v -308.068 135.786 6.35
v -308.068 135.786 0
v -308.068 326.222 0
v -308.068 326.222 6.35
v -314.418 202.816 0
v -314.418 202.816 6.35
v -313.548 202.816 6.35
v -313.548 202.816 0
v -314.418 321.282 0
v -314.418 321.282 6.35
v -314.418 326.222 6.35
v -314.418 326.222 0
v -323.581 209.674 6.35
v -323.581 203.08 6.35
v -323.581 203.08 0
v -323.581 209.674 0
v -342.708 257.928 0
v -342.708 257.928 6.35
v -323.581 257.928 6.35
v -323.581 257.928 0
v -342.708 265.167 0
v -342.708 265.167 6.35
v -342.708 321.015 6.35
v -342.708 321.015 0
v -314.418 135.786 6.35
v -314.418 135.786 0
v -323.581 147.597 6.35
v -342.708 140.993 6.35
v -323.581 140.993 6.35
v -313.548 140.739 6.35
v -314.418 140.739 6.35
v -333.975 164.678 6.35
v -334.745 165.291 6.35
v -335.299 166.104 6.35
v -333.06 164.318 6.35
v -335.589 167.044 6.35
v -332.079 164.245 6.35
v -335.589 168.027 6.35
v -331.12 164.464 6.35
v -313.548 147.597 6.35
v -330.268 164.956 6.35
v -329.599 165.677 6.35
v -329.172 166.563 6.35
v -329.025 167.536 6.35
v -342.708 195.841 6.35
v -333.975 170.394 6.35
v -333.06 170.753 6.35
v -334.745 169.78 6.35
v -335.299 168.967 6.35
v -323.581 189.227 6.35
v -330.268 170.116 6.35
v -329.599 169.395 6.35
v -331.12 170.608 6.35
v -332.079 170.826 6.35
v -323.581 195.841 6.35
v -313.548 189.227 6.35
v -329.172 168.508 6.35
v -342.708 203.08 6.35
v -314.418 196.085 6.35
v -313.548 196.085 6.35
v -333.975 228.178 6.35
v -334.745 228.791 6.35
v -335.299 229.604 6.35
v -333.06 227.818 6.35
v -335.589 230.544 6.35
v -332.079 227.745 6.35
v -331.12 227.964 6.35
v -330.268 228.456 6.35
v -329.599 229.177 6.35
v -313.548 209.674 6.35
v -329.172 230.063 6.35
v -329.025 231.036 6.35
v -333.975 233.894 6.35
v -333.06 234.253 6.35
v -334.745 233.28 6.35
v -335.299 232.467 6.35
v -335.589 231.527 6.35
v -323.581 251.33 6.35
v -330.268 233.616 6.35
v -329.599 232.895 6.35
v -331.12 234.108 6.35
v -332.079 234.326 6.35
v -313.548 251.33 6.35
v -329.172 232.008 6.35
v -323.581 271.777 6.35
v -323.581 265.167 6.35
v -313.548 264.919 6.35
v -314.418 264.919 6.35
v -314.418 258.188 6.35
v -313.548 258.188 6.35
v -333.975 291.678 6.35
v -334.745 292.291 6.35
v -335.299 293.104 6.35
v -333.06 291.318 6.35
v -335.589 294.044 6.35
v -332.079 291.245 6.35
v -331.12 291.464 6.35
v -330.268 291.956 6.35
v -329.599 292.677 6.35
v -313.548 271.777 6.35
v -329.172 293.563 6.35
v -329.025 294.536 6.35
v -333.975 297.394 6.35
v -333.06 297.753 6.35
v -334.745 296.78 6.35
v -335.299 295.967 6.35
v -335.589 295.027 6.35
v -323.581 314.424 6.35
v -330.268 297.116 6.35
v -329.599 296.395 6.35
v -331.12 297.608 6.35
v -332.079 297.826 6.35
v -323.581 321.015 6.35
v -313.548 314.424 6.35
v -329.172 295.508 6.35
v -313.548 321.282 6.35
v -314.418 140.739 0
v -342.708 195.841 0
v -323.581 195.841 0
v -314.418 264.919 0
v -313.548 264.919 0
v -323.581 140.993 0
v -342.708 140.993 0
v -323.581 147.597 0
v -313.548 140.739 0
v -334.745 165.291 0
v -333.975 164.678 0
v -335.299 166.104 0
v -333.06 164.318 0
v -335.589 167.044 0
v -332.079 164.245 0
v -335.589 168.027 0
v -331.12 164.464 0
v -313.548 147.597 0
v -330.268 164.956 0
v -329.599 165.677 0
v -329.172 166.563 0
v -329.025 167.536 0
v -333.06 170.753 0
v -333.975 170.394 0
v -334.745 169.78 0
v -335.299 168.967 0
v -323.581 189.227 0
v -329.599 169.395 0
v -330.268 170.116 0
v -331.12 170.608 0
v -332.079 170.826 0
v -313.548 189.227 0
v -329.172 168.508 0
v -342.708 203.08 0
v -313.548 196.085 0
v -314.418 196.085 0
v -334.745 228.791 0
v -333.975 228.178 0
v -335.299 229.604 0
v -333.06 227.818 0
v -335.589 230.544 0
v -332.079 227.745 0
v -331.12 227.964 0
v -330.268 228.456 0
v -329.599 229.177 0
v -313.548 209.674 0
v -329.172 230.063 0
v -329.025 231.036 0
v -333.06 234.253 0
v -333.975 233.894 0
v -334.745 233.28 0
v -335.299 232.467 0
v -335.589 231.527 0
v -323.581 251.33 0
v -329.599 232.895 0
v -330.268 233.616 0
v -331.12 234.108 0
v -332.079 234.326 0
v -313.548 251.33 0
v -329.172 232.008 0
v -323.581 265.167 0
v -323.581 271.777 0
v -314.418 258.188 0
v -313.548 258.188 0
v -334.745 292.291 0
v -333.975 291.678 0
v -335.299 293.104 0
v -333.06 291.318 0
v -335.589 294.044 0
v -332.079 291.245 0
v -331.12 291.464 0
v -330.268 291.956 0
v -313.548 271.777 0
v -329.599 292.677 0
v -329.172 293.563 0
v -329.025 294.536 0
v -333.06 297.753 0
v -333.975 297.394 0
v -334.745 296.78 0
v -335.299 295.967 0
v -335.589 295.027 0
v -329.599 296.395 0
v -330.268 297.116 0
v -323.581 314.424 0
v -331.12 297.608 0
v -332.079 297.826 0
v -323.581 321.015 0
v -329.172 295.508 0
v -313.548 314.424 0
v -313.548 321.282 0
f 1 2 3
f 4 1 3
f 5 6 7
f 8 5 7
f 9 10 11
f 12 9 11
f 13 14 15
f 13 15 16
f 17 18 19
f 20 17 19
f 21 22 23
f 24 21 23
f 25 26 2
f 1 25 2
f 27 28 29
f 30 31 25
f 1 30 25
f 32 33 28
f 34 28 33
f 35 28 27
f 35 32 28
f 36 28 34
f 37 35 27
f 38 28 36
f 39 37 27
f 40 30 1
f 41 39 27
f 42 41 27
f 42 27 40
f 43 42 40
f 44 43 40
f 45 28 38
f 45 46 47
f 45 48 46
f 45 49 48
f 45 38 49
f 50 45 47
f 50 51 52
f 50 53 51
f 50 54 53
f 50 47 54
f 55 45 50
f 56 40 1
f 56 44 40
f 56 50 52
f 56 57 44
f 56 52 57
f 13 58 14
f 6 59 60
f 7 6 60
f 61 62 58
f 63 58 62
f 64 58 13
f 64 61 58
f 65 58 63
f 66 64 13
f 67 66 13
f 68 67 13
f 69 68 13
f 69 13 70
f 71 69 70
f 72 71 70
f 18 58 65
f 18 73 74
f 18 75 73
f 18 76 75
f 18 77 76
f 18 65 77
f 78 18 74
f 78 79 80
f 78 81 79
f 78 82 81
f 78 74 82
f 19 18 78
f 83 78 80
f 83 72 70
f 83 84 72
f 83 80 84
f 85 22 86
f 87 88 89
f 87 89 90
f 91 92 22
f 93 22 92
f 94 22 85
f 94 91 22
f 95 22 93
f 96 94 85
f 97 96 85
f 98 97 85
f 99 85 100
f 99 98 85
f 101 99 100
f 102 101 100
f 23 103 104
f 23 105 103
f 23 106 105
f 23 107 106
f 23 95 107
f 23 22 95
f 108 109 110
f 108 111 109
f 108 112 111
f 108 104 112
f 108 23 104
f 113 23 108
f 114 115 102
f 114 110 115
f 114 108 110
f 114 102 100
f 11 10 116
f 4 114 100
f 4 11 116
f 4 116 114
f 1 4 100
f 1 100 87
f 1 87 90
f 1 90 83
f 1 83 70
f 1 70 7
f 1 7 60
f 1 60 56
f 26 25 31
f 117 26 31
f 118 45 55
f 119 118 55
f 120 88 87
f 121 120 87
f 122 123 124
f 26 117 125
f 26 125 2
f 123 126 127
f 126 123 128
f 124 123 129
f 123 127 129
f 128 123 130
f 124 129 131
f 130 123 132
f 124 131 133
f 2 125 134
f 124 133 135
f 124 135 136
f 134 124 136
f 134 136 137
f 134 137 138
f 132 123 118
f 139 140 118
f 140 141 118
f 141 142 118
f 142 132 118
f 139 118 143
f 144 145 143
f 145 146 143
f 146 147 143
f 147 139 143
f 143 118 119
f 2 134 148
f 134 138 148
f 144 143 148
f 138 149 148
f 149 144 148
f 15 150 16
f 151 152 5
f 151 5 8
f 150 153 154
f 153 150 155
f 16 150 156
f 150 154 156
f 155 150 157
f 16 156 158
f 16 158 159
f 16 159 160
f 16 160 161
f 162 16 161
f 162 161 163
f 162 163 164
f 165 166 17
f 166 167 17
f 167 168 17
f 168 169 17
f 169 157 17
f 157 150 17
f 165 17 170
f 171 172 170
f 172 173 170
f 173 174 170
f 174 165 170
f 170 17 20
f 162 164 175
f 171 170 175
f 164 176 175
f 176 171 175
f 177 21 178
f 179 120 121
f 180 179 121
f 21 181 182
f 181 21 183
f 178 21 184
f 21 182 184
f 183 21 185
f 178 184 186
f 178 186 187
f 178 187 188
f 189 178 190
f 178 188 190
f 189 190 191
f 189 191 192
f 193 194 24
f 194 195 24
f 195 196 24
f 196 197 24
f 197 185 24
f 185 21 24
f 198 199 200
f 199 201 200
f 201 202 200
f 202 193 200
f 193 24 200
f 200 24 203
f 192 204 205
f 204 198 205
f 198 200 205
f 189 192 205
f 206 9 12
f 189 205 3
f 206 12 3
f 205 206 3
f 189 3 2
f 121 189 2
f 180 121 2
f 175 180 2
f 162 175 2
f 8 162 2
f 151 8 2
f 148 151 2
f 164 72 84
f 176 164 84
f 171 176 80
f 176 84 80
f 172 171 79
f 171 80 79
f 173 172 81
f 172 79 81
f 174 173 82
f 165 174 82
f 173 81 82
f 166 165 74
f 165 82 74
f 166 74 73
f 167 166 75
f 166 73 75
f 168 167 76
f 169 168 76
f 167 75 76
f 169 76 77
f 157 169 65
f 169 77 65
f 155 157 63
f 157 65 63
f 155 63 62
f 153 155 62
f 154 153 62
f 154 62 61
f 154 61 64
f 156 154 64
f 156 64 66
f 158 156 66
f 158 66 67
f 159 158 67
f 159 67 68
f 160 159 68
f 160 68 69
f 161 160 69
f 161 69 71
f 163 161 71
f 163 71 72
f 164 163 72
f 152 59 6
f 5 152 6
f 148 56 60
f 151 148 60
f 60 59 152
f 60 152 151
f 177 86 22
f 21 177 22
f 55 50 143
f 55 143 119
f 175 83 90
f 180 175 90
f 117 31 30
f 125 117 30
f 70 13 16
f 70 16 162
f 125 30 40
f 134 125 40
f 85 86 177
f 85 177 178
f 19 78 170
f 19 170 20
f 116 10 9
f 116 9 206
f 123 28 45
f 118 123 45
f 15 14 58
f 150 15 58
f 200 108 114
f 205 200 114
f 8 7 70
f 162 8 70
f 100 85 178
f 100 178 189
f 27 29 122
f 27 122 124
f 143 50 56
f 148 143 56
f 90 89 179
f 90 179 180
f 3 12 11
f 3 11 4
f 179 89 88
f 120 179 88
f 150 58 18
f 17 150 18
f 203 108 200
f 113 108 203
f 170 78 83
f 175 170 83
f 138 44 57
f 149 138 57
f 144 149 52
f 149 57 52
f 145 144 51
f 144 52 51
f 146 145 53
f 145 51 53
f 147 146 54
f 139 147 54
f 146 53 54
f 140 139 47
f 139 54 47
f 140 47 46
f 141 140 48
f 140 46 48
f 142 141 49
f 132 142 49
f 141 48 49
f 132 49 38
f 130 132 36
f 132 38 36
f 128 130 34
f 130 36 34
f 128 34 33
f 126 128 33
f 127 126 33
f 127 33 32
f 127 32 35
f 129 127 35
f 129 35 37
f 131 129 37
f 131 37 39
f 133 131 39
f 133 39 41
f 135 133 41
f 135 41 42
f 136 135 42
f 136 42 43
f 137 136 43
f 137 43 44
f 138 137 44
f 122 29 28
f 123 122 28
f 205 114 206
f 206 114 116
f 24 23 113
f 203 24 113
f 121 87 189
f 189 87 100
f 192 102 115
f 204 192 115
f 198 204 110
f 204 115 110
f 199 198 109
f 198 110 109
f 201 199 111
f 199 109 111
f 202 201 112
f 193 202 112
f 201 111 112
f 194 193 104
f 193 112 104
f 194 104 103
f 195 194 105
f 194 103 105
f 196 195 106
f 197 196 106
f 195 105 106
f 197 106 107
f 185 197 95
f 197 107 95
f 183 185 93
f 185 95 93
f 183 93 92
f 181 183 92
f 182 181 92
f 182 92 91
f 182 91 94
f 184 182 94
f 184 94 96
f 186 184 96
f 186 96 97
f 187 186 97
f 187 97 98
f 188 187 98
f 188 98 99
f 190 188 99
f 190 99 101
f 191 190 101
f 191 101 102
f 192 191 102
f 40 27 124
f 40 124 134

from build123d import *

# Parameters (mm, degrees)
SKETCH2_W           = 40.132
SKETCH2_H           = 190.436
BOSS_EXTRUDE1_DEPTH = 6.35
SKETCH3_R           = 3.3
CUT_EXTRUDE1_DEPTH  = 478.183864302
SKETCH4_W           = 10.033
SKETCH4_H           = 6.858
CUT_EXTRUDE2_DEPTH  = 474.191260281


with BuildPart() as part:
    # Sketch2 → Boss-Extrude1 (new body)
    with BuildSketch(Plane.XY):
        with Locations((-328.134441571, 231.003658294)):
            Rectangle(SKETCH2_W, SKETCH2_H)
    extrude(amount=BOSS_EXTRUDE1_DEPTH)

    # Sketch3 → Cut-Extrude1 (cut, through all)
    with BuildSketch(Plane.XY.offset(6.35)):
        Polygon((-314.418441571, 195.840658294), (-314.418441571, 203.079658294), (-342.708441633, 203.079658294), (-342.708441633, 257.927658294), (-314.418441571, 257.927658294), (-314.418441571, 265.166658294), (-342.708441633, 265.166658294), (-342.708441633, 321.014658294), (-314.418441571, 321.014658294), (-314.418441571, 326.221658294), (-348.200441571, 326.221658294), (-348.200441571, 135.785658294), (-314.418441571, 135.785658294), (-314.418441571, 140.992658294), (-342.708441633, 140.992658294), (-342.708441633, 195.840658294), align=None)
        with Locations((-332.325441571, 294.535658294)):
            Circle(SKETCH3_R)
        with Locations((-332.325441571, 231.035658294)):
            Circle(SKETCH3_R)
        with Locations((-332.325441571, 167.535658294)):
            Circle(SKETCH3_R)
    extrude(amount=-CUT_EXTRUDE1_DEPTH, mode=Mode.SUBTRACT)

    # Sketch4 → Cut-Extrude2 (cut, through all)
    with BuildSketch(Plane.XY.offset(6.35)):
        with Locations((-318.564971808, 144.167658294)):
            Rectangle(SKETCH4_W, SKETCH4_H)
        with Locations((-318.564971808, 192.656258294)):
            Rectangle(SKETCH4_W, SKETCH4_H)
        with Locations((-318.564971808, 206.245258294)):
            Rectangle(SKETCH4_W, SKETCH4_H)
        with Locations((-318.564971808, 254.759258294)):
            Rectangle(SKETCH4_W, SKETCH4_H)
        with Locations((-318.564971808, 268.348258294)):
            Rectangle(SKETCH4_W, SKETCH4_H)
        with Locations((-318.564971808, 317.852858294)):
            Rectangle(SKETCH4_W, SKETCH4_H)
    extrude(amount=-CUT_EXTRUDE2_DEPTH, mode=Mode.SUBTRACT)


solid = part.part
